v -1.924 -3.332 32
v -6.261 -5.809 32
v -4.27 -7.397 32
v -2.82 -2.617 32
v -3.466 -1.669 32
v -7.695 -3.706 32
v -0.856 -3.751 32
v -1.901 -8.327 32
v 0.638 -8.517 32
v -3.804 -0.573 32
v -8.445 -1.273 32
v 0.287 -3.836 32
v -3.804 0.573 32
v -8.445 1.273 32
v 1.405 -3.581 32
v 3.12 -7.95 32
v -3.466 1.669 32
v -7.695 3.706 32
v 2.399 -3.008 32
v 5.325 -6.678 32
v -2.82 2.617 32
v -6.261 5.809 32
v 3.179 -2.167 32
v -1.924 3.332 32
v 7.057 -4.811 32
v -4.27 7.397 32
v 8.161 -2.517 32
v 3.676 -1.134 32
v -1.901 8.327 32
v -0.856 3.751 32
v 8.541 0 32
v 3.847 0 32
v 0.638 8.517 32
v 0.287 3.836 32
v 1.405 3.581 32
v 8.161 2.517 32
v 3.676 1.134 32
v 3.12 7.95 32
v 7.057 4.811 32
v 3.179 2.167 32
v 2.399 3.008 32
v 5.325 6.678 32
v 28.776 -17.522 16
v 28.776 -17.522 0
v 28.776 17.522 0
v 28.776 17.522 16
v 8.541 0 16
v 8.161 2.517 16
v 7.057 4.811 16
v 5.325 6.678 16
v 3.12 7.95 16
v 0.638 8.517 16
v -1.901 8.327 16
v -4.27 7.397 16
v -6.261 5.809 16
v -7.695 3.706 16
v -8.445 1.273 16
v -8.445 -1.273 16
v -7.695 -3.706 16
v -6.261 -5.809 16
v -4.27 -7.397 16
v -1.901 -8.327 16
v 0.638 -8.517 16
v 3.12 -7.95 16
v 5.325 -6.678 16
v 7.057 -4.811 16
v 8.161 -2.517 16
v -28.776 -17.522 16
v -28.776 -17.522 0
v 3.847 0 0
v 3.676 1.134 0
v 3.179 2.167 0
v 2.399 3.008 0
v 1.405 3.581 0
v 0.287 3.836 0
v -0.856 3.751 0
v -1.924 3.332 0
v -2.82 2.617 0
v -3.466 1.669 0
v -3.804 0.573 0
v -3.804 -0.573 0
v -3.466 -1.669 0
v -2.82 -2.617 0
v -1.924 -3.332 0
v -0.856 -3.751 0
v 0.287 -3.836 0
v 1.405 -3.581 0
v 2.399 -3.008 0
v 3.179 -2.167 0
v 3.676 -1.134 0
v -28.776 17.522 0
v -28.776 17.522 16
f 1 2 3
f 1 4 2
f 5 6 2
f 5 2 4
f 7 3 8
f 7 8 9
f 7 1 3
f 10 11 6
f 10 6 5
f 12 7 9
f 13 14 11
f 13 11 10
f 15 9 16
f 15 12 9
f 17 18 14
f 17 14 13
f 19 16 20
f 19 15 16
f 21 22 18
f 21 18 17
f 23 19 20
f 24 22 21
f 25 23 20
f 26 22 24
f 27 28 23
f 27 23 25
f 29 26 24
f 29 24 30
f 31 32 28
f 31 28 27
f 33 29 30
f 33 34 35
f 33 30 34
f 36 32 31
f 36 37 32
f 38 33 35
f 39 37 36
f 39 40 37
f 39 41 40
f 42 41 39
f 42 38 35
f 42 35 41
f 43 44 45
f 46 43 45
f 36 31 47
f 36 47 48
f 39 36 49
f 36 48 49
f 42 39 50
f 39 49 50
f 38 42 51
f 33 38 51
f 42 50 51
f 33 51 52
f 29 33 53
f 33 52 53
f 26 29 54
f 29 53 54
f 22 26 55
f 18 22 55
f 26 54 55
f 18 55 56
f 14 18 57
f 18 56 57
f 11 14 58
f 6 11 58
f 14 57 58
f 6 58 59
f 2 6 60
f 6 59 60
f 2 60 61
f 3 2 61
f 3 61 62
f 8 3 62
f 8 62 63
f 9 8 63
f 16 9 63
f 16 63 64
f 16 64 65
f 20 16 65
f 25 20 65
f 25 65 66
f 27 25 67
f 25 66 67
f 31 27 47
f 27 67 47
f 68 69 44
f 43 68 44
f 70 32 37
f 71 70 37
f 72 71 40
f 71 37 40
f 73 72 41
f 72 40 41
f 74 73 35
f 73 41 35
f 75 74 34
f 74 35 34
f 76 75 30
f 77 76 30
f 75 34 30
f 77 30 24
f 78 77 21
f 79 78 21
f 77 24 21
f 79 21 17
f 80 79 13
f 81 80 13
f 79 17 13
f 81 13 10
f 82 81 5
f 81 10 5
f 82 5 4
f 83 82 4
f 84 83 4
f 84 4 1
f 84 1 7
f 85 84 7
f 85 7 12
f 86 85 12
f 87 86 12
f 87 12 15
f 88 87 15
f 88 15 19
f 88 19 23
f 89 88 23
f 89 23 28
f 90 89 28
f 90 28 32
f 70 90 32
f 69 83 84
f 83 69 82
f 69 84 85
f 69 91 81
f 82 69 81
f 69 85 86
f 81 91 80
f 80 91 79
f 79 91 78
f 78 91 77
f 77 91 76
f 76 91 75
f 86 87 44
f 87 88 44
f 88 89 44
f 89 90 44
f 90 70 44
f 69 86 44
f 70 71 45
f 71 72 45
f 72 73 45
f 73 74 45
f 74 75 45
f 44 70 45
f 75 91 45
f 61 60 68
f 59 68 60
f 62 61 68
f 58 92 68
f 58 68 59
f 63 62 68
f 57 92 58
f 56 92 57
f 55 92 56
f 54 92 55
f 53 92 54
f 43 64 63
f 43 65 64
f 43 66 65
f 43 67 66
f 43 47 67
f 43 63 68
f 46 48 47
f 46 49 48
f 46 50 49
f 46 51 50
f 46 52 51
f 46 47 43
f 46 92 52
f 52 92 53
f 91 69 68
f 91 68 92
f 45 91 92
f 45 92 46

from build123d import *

# Parameters (mm, degrees)
SKETCH1_W           = 57.552398856
SKETCH1_H           = 35.043016192
BOSS_EXTRUDE1_DEPTH = 16
SKETCH2_R           = 8.540880827
BOSS_EXTRUDE2_DEPTH = 16
SKETCH3_R           = 3.847038177
CUT_EXTRUDE1_DEPTH  = 39


with BuildPart() as part:
    # Sketch1 → Boss-Extrude1 (new body)
    with BuildSketch(Plane.XY):
        Rectangle(SKETCH1_W, SKETCH1_H)
    extrude(amount=BOSS_EXTRUDE1_DEPTH)

    # Sketch2 → Boss-Extrude2 (add)
    with BuildSketch(Plane.XY.offset(16)):
        Circle(SKETCH2_R)
    extrude(amount=BOSS_EXTRUDE2_DEPTH)

    # Sketch3 → Cut-Extrude1 (cut)
    with BuildSketch(Plane.XY.offset(32)):
        Circle(SKETCH3_R)
    extrude(amount=-CUT_EXTRUDE1_DEPTH, mode=Mode.SUBTRACT)


solid = part.part
